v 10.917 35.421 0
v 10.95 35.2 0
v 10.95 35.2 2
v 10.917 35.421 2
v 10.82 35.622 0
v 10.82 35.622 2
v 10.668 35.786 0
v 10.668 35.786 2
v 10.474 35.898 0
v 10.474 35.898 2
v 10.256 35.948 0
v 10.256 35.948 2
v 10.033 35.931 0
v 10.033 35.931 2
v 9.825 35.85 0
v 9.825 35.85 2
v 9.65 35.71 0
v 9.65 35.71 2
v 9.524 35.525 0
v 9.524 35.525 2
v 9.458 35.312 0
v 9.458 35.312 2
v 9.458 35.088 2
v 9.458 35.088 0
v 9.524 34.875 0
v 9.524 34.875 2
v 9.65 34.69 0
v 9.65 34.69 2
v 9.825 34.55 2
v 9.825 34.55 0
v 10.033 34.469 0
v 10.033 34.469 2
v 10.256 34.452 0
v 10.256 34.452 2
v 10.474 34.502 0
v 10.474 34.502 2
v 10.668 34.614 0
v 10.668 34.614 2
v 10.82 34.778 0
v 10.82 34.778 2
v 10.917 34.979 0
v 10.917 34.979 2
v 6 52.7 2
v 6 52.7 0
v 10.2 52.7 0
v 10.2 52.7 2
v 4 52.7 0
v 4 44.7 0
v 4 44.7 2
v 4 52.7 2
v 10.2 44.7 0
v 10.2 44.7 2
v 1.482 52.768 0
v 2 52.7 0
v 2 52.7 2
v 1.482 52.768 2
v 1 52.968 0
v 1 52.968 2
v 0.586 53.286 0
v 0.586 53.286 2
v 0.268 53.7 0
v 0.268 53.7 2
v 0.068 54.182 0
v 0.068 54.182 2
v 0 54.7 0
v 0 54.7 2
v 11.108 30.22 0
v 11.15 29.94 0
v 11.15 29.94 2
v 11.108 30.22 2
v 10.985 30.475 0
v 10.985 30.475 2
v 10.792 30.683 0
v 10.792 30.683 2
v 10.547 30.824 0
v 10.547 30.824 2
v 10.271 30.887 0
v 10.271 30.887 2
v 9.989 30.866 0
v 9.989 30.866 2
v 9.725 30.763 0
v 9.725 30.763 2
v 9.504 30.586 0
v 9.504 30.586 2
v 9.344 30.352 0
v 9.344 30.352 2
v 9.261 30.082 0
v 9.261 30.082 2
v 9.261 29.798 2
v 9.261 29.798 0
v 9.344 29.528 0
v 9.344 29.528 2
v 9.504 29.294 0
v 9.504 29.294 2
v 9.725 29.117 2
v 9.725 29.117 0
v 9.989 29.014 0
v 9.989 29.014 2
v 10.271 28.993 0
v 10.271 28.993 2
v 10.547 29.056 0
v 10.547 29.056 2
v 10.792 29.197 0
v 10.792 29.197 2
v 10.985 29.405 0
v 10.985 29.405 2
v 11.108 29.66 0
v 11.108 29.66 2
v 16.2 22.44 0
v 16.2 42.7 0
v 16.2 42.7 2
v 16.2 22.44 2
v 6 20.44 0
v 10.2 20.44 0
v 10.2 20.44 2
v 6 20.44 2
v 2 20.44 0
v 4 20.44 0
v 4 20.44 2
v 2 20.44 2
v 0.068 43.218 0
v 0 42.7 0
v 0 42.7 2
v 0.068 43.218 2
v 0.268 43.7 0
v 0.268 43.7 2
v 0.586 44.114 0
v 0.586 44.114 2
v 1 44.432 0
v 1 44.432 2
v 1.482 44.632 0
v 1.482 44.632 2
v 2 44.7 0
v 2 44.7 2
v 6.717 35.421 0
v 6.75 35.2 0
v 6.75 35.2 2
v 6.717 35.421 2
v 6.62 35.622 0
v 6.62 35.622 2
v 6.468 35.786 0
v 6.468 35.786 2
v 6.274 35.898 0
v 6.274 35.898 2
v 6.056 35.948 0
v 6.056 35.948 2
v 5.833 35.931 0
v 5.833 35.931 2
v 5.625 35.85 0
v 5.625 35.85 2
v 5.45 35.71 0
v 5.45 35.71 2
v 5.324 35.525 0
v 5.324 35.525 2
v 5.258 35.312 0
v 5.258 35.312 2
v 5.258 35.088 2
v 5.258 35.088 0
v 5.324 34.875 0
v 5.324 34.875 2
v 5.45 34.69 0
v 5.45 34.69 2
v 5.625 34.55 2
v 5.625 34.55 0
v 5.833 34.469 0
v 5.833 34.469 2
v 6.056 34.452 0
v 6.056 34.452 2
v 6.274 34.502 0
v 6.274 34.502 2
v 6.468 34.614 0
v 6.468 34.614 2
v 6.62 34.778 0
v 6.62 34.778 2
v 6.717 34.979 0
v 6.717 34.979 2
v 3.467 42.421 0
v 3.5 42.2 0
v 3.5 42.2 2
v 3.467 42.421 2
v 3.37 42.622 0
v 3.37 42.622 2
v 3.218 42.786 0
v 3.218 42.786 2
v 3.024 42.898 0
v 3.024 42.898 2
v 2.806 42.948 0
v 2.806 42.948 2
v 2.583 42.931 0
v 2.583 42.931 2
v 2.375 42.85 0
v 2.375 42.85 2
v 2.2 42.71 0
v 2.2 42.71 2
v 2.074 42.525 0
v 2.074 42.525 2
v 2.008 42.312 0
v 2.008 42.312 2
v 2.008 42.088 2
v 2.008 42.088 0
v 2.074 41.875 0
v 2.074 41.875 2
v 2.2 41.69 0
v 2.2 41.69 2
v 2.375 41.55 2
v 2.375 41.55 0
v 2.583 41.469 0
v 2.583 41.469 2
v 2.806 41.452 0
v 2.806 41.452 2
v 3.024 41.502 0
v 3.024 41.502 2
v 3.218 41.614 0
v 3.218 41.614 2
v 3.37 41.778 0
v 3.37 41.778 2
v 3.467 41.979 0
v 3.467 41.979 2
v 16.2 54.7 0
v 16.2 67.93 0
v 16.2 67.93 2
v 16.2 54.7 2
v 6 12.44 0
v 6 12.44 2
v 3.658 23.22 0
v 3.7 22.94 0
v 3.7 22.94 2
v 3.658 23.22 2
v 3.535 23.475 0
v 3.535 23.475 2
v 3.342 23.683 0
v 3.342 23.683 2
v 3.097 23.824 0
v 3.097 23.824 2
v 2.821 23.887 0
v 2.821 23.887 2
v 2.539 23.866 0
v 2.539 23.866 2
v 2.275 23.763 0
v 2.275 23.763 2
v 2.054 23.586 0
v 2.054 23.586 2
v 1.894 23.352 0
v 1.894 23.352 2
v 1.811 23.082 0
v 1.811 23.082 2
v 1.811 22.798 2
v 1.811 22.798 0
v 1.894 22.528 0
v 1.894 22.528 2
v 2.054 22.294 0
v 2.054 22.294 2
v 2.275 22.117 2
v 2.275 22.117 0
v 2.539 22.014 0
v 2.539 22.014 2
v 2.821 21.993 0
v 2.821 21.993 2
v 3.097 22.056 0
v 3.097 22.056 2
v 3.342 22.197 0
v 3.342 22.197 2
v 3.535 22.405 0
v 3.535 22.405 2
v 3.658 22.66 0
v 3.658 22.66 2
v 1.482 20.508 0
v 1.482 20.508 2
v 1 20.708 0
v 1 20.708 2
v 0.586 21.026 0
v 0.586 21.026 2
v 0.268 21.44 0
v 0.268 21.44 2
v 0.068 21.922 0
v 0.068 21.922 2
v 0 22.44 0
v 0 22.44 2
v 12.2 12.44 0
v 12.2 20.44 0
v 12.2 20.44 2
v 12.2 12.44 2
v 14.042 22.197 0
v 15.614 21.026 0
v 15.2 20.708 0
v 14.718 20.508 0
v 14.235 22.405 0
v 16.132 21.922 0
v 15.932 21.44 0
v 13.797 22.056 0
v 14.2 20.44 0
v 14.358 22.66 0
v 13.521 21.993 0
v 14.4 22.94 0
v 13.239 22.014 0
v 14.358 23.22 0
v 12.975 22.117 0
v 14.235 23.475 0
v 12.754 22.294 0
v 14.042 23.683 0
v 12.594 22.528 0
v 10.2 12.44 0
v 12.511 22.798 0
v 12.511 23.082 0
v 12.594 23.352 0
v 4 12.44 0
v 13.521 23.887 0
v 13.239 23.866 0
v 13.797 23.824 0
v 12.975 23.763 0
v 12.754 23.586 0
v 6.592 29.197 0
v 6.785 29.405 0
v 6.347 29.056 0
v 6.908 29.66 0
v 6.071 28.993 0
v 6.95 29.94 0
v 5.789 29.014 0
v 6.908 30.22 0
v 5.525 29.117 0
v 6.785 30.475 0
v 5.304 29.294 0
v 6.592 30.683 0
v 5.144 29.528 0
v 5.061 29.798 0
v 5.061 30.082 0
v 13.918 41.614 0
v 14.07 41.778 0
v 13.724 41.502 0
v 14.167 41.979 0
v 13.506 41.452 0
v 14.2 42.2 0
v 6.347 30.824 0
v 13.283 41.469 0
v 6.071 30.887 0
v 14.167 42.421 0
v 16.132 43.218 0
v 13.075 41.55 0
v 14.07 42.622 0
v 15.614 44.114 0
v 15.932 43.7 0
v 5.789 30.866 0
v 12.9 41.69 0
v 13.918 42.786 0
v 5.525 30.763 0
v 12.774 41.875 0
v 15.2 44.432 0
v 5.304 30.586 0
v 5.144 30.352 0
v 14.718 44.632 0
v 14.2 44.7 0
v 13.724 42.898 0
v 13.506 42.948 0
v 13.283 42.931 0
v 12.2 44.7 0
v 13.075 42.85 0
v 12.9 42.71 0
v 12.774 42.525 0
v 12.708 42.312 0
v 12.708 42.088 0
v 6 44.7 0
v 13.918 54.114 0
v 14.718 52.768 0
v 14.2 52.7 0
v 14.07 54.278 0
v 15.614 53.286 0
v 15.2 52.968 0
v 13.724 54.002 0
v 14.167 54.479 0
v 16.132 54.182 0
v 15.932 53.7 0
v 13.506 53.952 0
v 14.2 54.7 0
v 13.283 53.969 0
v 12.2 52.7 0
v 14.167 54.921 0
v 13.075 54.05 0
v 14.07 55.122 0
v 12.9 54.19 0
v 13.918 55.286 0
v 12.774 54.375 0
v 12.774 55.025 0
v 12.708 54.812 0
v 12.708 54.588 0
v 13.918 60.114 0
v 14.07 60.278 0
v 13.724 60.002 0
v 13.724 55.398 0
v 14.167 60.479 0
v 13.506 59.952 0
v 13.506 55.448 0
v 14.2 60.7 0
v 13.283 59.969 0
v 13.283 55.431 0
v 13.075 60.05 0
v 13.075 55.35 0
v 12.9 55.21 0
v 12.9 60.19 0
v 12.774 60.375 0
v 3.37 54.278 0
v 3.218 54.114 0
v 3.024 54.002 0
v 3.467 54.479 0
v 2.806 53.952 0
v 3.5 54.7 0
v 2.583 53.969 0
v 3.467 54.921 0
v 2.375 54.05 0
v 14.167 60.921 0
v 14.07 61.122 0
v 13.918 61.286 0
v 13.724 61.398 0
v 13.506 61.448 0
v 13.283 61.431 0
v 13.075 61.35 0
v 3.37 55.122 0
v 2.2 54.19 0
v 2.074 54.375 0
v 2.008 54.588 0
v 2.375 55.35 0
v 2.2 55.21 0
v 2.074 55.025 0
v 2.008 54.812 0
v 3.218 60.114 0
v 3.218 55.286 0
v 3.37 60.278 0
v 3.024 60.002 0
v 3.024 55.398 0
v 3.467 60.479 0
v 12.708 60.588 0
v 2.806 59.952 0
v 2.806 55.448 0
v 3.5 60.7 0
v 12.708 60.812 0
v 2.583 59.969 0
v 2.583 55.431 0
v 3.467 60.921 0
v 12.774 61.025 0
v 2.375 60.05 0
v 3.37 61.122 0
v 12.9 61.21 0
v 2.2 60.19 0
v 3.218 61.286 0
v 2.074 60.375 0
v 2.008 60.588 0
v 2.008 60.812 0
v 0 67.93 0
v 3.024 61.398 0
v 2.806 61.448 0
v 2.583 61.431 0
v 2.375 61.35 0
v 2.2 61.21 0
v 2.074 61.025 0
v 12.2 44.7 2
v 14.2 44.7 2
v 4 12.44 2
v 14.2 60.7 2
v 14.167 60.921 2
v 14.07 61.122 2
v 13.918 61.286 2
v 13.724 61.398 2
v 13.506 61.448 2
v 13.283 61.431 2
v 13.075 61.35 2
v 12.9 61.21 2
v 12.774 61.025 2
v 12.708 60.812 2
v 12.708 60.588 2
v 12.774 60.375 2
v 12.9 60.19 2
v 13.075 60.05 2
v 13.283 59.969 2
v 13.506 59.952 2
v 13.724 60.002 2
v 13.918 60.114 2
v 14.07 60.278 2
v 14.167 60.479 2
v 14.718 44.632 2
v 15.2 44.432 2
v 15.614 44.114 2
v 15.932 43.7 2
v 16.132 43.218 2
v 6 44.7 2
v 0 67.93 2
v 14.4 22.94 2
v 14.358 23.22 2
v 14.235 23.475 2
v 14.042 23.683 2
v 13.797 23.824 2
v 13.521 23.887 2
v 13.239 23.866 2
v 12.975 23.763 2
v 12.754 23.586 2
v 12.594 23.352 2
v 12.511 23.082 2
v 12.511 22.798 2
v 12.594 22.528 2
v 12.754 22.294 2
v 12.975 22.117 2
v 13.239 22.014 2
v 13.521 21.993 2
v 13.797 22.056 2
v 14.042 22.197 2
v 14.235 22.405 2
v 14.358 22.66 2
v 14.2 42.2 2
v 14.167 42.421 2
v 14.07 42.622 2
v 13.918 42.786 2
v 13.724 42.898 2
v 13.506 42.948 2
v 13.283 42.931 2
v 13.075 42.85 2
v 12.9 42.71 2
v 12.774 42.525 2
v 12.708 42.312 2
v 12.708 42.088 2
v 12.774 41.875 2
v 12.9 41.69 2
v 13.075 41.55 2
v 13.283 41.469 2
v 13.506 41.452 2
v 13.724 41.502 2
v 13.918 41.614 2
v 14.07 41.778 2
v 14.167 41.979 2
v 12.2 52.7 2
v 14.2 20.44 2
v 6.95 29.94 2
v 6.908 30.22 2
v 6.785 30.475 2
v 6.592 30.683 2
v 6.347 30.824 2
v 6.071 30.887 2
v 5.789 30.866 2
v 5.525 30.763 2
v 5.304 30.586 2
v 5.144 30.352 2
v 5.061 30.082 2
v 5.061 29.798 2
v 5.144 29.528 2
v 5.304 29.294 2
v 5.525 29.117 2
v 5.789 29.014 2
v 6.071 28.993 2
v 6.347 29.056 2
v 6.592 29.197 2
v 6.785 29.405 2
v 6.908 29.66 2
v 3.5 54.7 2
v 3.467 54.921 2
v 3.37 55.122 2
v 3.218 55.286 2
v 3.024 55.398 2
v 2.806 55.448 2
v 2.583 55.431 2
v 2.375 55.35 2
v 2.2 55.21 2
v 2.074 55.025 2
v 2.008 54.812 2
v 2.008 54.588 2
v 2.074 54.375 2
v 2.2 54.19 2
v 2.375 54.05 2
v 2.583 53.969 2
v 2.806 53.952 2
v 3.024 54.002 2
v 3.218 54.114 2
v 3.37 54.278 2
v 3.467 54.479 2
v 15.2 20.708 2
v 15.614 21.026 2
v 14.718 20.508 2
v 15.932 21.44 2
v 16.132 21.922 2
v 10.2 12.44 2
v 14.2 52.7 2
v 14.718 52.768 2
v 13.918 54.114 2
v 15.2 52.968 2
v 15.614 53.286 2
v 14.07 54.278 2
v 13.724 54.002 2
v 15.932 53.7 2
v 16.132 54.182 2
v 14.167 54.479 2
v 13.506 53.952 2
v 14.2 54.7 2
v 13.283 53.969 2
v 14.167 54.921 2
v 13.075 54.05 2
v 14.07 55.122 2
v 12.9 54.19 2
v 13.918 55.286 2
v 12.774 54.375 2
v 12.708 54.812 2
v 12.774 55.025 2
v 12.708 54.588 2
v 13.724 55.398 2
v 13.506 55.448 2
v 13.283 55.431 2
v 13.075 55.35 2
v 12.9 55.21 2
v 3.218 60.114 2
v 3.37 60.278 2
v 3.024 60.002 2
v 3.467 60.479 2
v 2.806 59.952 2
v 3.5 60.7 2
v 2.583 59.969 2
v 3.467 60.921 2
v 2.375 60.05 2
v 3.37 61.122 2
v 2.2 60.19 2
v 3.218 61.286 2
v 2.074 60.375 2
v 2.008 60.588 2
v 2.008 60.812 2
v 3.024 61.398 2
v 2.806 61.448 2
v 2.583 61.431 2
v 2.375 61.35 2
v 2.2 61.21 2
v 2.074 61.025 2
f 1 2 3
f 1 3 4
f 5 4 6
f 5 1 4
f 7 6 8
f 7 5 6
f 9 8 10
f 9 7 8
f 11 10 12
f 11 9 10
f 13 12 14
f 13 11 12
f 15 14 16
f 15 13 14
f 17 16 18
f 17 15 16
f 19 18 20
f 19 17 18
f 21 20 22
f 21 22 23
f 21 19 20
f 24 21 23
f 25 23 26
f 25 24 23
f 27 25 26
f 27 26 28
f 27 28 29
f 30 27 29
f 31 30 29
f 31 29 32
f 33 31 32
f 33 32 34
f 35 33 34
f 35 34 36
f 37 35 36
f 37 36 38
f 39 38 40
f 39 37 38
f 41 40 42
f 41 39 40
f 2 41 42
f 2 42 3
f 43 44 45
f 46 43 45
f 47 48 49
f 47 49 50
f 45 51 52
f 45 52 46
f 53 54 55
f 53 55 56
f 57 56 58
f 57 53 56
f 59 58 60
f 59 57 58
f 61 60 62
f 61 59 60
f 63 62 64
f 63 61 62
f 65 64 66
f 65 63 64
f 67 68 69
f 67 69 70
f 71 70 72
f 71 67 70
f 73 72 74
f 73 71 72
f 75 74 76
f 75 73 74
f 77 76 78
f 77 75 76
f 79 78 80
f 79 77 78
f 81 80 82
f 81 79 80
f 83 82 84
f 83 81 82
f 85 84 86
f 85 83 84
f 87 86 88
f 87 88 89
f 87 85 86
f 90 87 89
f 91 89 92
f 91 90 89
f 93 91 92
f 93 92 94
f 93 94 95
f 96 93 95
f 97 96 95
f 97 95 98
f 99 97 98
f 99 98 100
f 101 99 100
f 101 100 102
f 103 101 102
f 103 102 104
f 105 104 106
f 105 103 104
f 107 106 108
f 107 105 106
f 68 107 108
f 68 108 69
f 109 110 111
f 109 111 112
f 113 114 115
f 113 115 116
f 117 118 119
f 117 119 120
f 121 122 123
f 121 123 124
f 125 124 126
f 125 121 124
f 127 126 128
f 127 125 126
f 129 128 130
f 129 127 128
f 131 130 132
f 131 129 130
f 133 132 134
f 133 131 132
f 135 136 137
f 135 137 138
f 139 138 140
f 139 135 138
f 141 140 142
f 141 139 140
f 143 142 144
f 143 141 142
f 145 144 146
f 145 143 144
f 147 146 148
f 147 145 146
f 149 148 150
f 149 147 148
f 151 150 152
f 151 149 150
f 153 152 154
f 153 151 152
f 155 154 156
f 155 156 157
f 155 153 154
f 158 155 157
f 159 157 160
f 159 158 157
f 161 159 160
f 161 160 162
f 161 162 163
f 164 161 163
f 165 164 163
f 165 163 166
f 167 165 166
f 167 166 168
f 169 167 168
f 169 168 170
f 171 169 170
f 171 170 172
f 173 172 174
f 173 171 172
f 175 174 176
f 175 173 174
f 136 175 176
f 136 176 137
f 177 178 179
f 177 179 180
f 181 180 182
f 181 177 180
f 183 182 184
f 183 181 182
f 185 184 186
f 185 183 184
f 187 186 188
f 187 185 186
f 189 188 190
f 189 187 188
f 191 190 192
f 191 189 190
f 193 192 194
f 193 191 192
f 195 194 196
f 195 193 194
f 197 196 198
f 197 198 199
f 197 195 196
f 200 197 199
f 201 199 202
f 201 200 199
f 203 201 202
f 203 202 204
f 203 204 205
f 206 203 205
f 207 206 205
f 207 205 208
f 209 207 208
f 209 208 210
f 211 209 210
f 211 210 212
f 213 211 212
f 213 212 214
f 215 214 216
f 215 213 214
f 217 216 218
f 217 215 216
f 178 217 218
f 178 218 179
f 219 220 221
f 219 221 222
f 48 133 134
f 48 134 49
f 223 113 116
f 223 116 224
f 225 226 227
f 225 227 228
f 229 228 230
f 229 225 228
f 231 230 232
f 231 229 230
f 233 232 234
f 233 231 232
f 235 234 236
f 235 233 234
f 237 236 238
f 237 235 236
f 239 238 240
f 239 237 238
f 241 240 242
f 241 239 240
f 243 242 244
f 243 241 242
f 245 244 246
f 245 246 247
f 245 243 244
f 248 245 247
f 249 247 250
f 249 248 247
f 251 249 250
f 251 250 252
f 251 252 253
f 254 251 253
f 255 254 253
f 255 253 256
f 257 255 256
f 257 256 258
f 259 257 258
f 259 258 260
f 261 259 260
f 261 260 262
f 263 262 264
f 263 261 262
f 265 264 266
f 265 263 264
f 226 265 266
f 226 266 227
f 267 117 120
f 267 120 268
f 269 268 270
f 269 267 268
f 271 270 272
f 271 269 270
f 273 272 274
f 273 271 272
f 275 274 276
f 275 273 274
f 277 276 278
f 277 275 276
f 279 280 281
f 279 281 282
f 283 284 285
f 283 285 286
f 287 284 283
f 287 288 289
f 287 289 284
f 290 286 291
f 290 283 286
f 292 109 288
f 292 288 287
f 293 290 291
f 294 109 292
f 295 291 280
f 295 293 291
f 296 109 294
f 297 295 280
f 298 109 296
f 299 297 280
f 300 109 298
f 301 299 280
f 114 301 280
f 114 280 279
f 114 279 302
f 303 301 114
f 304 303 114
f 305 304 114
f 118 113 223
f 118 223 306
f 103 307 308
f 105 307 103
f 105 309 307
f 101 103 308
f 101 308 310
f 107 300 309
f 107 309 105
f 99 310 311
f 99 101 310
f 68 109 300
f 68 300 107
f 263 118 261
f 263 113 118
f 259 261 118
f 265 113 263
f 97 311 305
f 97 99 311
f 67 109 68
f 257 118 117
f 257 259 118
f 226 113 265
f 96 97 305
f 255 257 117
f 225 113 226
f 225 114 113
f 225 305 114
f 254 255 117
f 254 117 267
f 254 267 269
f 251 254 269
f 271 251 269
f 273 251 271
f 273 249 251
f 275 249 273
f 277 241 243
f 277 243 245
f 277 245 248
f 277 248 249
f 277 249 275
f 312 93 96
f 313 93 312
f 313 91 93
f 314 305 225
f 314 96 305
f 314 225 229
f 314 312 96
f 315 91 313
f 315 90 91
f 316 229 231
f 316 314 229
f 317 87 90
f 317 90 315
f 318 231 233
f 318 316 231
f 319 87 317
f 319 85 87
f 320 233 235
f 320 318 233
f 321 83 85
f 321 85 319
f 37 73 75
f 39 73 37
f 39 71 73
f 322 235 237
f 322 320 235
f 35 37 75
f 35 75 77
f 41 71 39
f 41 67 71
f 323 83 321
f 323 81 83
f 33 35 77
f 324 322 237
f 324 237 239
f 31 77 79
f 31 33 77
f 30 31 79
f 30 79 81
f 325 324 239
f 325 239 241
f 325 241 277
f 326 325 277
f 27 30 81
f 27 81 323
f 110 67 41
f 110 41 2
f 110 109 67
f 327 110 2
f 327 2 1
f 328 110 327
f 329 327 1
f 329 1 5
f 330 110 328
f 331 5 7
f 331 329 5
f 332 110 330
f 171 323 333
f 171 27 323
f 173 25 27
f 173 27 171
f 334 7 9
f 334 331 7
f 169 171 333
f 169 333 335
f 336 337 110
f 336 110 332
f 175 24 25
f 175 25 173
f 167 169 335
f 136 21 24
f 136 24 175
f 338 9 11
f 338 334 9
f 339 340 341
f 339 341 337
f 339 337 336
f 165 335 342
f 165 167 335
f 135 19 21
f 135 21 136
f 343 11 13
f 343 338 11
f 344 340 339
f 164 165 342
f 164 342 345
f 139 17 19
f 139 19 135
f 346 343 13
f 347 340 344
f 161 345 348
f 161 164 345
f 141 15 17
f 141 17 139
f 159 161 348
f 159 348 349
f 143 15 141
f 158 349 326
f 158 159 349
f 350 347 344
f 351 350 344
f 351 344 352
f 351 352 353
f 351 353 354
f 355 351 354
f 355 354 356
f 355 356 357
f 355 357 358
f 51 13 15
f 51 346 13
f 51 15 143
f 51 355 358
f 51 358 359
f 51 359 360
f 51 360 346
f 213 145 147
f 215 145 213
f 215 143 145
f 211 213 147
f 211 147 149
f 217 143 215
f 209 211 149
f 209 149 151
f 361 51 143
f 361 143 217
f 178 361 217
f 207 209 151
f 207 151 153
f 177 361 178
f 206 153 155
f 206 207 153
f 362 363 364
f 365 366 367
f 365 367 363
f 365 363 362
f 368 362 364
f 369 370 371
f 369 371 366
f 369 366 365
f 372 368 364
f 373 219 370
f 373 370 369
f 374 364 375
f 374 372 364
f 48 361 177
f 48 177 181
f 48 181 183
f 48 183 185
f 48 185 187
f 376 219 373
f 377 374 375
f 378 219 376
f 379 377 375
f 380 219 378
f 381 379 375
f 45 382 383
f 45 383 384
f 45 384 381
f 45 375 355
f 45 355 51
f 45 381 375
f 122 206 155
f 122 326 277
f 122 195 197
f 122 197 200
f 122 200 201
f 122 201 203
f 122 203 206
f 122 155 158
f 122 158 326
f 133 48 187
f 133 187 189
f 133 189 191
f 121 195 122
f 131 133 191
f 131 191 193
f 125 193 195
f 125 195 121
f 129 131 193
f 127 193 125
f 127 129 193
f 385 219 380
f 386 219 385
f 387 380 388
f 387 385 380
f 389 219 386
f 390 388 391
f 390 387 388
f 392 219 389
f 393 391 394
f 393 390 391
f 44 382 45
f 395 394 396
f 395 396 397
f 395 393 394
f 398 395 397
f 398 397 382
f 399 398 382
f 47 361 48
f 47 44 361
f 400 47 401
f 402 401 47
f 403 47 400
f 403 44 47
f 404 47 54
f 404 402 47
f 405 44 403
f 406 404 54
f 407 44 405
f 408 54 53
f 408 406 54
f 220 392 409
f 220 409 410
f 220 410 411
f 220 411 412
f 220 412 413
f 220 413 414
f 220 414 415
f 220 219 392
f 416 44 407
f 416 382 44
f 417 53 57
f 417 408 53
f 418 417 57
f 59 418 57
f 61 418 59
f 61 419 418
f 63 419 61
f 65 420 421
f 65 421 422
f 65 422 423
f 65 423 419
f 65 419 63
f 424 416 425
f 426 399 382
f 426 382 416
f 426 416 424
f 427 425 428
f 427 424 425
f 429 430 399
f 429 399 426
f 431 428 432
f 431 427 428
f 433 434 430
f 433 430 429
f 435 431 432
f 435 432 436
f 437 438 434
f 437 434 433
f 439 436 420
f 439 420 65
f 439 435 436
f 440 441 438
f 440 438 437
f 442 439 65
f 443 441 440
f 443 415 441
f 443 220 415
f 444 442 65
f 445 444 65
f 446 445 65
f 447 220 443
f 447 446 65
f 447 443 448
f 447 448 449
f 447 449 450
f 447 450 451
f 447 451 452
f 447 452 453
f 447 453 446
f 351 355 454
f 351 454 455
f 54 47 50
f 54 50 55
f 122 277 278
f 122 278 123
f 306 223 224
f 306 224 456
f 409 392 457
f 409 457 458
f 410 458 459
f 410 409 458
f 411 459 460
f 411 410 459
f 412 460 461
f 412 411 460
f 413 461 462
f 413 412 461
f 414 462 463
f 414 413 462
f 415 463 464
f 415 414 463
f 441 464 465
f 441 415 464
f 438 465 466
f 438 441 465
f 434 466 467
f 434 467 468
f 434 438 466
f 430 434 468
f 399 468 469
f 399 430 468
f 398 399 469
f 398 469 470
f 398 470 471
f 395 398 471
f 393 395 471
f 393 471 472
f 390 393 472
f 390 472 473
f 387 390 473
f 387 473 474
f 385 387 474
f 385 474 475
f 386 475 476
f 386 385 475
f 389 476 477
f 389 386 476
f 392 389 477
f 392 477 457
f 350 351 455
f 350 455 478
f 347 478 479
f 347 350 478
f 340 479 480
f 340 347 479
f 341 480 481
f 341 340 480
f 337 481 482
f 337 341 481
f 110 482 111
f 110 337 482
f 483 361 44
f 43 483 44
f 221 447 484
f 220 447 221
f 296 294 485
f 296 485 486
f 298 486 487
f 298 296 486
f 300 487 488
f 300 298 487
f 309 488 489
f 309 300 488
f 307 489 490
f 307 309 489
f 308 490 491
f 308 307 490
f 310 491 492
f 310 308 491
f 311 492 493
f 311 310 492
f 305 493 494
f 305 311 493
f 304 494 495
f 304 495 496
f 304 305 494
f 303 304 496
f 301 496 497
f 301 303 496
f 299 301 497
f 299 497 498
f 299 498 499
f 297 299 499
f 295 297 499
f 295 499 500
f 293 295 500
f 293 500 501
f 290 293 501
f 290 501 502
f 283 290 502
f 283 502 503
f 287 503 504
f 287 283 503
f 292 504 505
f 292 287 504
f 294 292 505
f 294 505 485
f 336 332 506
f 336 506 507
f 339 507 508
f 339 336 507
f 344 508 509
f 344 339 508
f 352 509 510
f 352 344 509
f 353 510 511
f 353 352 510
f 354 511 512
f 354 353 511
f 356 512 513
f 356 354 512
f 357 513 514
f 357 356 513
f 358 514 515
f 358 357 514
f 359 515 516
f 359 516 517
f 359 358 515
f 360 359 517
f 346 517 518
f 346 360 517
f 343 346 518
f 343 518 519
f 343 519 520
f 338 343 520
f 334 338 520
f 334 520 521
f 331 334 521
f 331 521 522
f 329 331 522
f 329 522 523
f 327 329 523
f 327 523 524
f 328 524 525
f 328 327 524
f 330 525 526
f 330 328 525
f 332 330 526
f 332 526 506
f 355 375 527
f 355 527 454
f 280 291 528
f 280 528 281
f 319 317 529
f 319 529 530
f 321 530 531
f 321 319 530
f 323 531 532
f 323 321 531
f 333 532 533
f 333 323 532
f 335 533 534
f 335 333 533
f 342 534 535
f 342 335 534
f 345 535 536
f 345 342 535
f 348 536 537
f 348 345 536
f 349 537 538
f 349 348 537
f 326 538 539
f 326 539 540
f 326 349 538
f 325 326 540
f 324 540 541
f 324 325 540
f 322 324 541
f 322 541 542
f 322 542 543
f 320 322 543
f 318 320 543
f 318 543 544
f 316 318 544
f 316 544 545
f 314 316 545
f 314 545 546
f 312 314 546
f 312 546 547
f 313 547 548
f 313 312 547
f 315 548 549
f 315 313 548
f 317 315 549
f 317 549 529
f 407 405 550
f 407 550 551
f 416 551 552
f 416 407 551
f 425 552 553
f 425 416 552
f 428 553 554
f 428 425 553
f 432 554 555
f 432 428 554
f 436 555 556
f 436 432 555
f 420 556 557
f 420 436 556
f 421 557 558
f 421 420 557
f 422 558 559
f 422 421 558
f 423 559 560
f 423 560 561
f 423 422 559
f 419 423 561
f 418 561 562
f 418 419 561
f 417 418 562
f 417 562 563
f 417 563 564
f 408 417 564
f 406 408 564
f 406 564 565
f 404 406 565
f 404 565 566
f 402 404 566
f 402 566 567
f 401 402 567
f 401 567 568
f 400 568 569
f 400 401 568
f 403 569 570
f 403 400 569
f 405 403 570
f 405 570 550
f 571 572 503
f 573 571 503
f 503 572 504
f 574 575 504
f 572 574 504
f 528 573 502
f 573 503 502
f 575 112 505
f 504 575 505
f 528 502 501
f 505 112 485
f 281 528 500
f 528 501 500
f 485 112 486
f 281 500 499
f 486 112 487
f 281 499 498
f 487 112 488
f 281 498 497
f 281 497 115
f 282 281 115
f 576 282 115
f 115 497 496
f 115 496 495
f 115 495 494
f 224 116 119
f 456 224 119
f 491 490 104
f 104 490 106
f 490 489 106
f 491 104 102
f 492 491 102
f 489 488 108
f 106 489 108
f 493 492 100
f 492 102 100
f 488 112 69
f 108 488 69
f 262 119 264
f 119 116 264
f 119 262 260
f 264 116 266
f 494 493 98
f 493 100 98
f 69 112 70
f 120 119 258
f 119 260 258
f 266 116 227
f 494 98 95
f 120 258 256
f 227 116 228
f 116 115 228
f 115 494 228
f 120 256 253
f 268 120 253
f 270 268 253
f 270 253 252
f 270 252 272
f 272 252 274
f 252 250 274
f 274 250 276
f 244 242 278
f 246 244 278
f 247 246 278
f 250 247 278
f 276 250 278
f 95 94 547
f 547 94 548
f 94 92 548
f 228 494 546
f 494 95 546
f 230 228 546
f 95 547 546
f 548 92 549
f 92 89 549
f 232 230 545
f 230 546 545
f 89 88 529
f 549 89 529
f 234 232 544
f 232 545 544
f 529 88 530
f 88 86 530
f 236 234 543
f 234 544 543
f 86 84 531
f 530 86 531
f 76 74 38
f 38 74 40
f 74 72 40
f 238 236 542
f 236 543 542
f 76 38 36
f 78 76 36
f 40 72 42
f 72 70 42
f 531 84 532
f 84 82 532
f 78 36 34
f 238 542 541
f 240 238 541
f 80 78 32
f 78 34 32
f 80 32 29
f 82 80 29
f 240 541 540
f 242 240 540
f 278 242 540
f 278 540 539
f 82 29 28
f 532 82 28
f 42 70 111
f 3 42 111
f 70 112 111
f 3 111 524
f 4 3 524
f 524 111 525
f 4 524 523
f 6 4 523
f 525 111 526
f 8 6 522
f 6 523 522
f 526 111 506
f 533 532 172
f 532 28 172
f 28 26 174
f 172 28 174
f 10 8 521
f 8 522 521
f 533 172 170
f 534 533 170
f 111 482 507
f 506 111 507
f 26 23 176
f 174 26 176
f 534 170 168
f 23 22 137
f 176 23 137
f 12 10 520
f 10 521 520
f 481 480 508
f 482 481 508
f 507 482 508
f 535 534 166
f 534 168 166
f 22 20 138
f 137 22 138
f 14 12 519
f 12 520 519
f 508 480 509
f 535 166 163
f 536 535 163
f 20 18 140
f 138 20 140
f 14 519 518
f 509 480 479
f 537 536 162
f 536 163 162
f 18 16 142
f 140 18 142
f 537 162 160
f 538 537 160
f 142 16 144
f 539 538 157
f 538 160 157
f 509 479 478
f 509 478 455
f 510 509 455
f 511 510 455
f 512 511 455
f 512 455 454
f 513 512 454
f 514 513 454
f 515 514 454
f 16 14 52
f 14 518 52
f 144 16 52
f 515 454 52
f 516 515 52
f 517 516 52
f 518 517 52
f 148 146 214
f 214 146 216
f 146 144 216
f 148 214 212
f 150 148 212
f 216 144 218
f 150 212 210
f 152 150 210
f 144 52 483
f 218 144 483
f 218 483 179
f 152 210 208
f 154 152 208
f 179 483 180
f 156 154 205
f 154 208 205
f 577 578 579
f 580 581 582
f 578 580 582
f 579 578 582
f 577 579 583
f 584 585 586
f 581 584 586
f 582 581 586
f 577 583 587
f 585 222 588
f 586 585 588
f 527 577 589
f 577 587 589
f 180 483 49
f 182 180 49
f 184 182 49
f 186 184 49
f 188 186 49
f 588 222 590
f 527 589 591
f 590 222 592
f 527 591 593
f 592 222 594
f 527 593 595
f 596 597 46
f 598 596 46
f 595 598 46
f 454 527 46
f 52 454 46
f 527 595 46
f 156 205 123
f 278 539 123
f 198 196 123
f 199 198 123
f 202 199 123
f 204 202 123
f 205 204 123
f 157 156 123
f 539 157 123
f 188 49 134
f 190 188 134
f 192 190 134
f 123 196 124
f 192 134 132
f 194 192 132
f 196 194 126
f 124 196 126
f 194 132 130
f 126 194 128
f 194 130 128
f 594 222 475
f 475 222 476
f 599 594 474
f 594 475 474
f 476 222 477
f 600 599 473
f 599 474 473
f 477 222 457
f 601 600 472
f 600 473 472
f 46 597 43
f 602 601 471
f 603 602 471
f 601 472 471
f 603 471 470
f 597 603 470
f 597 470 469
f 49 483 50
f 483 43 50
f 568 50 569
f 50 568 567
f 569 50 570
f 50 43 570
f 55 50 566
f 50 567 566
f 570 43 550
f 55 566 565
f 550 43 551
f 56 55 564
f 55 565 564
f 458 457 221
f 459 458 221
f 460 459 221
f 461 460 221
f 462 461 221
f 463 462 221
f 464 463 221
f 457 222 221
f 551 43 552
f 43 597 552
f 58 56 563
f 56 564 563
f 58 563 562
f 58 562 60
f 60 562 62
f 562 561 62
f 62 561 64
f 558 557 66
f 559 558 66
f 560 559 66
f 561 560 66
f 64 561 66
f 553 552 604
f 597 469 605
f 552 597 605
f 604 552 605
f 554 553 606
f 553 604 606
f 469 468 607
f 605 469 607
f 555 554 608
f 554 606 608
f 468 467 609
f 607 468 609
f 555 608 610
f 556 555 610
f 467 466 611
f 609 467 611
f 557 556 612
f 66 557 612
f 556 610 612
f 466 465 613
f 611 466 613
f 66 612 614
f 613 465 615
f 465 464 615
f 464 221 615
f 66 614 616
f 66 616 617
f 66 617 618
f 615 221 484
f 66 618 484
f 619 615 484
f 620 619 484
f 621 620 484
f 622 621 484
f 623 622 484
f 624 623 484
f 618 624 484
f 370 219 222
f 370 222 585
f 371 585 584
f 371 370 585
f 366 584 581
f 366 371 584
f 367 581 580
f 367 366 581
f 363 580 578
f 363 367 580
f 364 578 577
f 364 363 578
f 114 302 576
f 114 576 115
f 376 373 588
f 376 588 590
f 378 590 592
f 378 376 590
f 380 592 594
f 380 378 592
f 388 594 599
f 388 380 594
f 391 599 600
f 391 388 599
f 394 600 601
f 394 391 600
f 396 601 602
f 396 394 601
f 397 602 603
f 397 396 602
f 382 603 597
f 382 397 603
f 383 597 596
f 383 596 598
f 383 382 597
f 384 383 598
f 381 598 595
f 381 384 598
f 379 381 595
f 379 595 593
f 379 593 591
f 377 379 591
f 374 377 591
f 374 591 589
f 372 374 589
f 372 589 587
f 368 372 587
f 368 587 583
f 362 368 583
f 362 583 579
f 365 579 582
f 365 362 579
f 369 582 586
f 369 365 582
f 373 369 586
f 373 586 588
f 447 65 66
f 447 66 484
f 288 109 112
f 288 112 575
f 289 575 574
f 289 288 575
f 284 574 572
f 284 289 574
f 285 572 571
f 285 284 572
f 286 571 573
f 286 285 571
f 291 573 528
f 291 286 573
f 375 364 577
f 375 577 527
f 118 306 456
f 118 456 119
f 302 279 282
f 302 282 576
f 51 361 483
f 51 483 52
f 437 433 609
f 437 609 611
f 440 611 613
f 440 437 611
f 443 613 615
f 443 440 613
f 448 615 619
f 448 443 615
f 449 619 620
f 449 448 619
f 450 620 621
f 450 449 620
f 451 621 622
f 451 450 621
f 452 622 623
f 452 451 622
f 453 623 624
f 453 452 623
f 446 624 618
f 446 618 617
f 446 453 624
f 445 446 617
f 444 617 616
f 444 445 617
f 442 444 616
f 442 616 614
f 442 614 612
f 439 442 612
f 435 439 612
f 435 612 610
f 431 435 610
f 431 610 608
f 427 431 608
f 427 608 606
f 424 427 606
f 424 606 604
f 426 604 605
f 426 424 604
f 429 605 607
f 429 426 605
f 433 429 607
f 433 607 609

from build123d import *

# Parameters (mm, degrees)
SKETCH1_R           = 0.75
SKETCH1_R_2         = 0.95
SKETCH1_W           = 4.2
SKETCH1_H           = 8
BOSS_EXTRUDE1_DEPTH = 2


with BuildPart() as part:
    # Sketch1 → Boss-Extrude1 (new body)
    with BuildSketch(Plane.XY):
        with BuildLine():
            Line((4, 44.7), (4, 52.7))
            Line((4, 52.7), (2, 52.7))
            ThreePointArc((2, 52.7), (0.585786438, 53.285786438), (0, 54.7))
            Line((0, 54.7), (0, 67.93))
            Line((0, 67.93), (16.2, 67.93))
            Line((16.2, 67.93), (16.2, 54.7))
            ThreePointArc((16.2, 54.7), (15.614213562, 53.285786438), (14.2, 52.7))
            Line((14.2, 52.7), (12.2, 52.7))
            Line((12.2, 52.7), (12.2, 44.7))
            Line((12.2, 44.7), (14.2, 44.7))
            ThreePointArc((14.2, 44.7), (15.614213562, 44.114213562), (16.2, 42.7))
            Line((16.2, 42.7), (16.2, 22.44))
            ThreePointArc((16.2, 22.44), (15.614213562, 21.025786438), (14.2, 20.44))
            Line((14.2, 20.44), (12.2, 20.44))
            Line((12.2, 20.44), (12.2, 12.44))
            Line((12.2, 12.44), (10.2, 12.44))
            Line((10.2, 12.44), (10.2, 20.44))
            Line((10.2, 20.44), (6, 20.44))
            Line((6, 20.44), (6, 12.44))
            Line((6, 12.44), (4, 12.44))
            Line((4, 12.44), (4, 20.44))
            Line((4, 20.44), (2, 20.44))
            ThreePointArc((2, 20.44), (0.585786438, 21.025786438), (0, 22.44))
            Line((0, 22.44), (0, 42.7))
            ThreePointArc((0, 42.7), (0.585786438, 44.114213562), (2, 44.7))
            Line((2, 44.7), (4, 44.7))
        make_face()
        with Locations((2.75, 60.7)):
            Circle(SKETCH1_R, mode=Mode.SUBTRACT)
        with Locations((13.45, 54.7)):
            Circle(SKETCH1_R, mode=Mode.SUBTRACT)
        with Locations((13.45, 42.2)):
            Circle(SKETCH1_R, mode=Mode.SUBTRACT)
        with Locations((13.45, 22.94)):
            Circle(SKETCH1_R_2, mode=Mode.SUBTRACT)
        with Locations((10.2, 29.94)):
            Circle(SKETCH1_R_2, mode=Mode.SUBTRACT)
        with Locations((6, 35.2)):
            Circle(SKETCH1_R, mode=Mode.SUBTRACT)
        with Locations((13.45, 60.7)):
            Circle(SKETCH1_R, mode=Mode.SUBTRACT)
        with Locations((10.2, 35.2)):
            Circle(SKETCH1_R, mode=Mode.SUBTRACT)
        with Locations((6, 29.94)):
            Circle(SKETCH1_R_2, mode=Mode.SUBTRACT)
        with Locations((2.75, 22.94)):
            Circle(SKETCH1_R_2, mode=Mode.SUBTRACT)
        with Locations((2.75, 42.2)):
            Circle(SKETCH1_R, mode=Mode.SUBTRACT)
        with Locations((2.75, 54.7)):
            Circle(SKETCH1_R, mode=Mode.SUBTRACT)
        with Locations((8.1, 48.7)):
            Rectangle(SKETCH1_W, SKETCH1_H, mode=Mode.SUBTRACT)
    extrude(amount=BOSS_EXTRUDE1_DEPTH)


solid = part.part
